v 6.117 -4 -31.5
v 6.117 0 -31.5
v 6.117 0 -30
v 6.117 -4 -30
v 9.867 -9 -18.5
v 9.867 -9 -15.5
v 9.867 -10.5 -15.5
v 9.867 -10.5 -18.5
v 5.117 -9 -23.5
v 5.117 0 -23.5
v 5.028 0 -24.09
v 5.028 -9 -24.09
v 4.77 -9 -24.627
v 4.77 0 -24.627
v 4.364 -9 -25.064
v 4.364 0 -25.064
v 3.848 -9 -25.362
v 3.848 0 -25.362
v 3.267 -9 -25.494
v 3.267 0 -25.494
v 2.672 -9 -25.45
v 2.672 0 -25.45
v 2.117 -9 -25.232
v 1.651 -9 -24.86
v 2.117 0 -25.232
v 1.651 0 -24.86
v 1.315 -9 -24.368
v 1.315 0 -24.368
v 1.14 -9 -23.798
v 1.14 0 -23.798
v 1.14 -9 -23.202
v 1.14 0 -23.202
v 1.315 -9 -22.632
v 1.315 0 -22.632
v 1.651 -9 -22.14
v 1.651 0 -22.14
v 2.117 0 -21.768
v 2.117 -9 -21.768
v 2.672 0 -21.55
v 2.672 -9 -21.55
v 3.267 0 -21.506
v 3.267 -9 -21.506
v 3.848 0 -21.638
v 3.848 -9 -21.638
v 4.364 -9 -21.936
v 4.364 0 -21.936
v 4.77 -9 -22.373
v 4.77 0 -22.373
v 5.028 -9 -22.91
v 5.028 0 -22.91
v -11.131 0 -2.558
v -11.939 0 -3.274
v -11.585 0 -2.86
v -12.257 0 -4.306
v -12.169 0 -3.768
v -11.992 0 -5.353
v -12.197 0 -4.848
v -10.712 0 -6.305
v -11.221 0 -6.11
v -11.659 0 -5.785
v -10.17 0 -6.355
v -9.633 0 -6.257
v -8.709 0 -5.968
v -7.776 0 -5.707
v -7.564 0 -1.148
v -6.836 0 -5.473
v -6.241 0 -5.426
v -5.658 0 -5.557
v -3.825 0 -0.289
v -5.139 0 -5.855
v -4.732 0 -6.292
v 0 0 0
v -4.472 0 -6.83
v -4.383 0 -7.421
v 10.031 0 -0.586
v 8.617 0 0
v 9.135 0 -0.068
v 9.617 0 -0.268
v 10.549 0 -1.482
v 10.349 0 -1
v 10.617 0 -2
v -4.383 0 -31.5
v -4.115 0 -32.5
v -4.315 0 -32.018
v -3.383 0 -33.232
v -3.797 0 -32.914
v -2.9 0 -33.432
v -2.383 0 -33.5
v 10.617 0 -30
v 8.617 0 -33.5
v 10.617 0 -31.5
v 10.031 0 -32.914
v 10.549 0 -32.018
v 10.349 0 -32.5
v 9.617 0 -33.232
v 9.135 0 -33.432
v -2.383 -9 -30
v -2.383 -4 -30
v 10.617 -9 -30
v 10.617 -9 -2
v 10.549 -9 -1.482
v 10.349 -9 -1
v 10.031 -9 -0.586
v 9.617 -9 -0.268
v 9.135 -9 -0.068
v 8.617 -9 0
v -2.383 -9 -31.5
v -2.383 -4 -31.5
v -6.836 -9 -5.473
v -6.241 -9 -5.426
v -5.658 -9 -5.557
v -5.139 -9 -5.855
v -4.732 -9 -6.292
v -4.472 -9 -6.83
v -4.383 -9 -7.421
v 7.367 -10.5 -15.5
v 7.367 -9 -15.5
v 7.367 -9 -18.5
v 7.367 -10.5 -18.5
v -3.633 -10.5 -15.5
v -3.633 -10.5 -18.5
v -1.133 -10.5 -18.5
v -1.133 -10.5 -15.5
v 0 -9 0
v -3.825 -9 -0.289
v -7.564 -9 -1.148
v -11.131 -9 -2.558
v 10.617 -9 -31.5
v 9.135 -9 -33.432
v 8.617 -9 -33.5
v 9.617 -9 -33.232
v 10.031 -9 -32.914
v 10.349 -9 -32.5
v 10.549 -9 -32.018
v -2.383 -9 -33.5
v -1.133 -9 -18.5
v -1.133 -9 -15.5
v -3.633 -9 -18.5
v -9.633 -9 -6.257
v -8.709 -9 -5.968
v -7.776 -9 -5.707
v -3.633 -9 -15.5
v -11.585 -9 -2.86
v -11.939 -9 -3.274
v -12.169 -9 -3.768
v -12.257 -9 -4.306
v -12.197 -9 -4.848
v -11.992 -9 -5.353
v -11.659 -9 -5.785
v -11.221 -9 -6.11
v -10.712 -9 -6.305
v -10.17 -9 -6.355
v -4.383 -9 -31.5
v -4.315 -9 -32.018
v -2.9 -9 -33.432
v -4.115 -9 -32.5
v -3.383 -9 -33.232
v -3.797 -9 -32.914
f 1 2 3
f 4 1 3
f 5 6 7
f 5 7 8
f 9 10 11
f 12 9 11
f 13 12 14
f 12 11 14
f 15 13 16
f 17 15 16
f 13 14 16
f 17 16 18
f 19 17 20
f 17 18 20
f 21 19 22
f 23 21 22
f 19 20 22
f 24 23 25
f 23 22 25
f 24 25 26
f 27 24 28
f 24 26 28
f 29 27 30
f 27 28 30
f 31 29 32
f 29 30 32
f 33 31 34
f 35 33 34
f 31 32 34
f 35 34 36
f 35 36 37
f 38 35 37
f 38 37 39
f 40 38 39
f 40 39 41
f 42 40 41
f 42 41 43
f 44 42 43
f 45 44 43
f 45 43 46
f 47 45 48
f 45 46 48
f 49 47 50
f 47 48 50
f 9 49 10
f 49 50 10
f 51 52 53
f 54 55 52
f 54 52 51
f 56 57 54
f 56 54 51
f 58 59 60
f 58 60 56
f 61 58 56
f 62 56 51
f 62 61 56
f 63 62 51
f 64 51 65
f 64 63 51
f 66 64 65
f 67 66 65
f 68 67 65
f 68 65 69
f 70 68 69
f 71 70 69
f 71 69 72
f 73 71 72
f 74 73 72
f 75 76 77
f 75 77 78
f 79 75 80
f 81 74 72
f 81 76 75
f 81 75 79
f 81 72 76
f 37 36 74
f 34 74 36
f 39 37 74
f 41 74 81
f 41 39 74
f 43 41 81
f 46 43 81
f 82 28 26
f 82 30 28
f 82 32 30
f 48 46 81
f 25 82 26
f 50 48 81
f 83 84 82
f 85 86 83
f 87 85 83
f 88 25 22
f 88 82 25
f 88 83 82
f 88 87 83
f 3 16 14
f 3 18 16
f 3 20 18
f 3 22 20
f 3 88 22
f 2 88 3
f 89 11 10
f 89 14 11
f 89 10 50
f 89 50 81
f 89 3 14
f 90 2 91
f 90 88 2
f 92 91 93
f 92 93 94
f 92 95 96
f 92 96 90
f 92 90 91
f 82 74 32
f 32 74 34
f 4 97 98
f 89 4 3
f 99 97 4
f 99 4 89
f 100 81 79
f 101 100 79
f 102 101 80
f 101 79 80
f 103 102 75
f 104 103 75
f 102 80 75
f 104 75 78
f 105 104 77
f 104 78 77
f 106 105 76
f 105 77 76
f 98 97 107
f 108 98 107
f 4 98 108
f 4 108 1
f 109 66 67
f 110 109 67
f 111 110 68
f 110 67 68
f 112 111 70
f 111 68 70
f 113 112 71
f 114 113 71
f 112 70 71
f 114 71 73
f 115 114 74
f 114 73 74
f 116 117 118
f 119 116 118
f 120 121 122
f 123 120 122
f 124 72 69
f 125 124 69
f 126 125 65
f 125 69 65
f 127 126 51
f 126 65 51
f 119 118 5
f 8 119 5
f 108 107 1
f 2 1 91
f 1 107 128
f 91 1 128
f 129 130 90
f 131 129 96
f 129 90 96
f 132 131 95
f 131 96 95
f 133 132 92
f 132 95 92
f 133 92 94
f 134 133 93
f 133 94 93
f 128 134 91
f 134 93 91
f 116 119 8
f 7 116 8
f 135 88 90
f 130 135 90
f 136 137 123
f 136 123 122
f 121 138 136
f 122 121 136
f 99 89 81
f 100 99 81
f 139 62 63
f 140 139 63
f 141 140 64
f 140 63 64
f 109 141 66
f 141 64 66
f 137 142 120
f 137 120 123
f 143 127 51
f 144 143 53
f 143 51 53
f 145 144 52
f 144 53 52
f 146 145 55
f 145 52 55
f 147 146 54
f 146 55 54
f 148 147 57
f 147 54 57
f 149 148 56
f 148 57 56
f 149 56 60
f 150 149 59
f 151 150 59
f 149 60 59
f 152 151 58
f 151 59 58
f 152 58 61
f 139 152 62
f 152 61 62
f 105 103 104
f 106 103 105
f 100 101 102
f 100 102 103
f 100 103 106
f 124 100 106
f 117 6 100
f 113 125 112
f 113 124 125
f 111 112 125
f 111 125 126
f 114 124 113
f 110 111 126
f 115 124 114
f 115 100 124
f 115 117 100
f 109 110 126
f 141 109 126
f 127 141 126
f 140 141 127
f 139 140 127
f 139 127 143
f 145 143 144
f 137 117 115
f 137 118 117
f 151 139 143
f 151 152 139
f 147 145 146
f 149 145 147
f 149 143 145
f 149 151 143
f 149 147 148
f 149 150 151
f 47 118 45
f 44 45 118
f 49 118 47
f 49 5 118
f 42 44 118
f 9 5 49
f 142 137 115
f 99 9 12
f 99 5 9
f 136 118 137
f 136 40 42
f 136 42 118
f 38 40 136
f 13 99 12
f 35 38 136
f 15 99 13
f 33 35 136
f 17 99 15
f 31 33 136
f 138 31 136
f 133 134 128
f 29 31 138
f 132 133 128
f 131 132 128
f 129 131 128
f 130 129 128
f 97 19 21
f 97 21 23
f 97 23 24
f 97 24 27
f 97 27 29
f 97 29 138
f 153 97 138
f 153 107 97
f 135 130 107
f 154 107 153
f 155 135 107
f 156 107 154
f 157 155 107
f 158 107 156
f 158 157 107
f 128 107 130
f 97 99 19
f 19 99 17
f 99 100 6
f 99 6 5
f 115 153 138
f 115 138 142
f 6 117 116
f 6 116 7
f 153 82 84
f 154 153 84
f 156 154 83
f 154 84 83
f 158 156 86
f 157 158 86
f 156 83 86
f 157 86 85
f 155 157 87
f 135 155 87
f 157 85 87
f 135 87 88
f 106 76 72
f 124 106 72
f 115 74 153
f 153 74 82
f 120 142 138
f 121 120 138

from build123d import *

# Parameters (mm, degrees)
SKETCH_1_R          = 2
EXTRUDE_1_DEPTH     = 9
SKETCH_3_W          = 2.5
SKETCH_3_H          = 3
EXTRUDE_2_DEPTH     = 1.5
CUT_EXTRUDE_1_REACH = 11
SKETCH_5_W          = 13
SKETCH_5_H          = 1.5
SKETCH_7_W          = 8.5
SKETCH_7_H          = 1.5
EXTRUDE_3_DEPTH     = 4
SKETCH_9_W          = 49.545975543
SKETCH_9_H          = 42.208236046
CUT_EXTRUDE_3_DEPTH = 11.5


with BuildPart() as part:
    # 草图1 → 凸台-拉伸1 (new body)
    with BuildSketch(Plane(origin=(0, 0, 0), x_dir=(1, 0, 0), z_dir=(0, 1, 0))):
        with BuildLine():
            Line((-2.382835885, 33.5), (8.617164115, 33.5))
            ThreePointArc((8.617164115, 33.5), (10.031377677, 32.914213562), (10.617164115, 31.5))
            Line((10.617164115, 31.5), (10.617164115, 2))
            ThreePointArc((10.617164115, 2), (10.031377677, 0.585786438), (8.617164115, 0))
            Line((8.617164115, 0), (0, 0))
            ThreePointArc((0, 0), (-5.710600422, 0.647655185), (-11.131122415, 2.557722132))
            ThreePointArc((-11.131122415, 2.557722132), (-12.111898361, 5.107720531), (-9.633282348, 6.257014206))
            ThreePointArc((-9.633282348, 6.257014206), (-8.243555708, 5.833986106), (-6.836394497, 5.473167269))
            ThreePointArc((-6.836394497, 5.473167269), (-5.139275919, 5.854675685), (-4.382835885, 7.421059613))
            Line((-4.382835885, 7.421059613), (-4.382835885, 31.5))
            ThreePointArc((-4.382835885, 31.5), (-3.797049447, 32.914213562), (-2.382835885, 33.5))
        make_face()
        with Locations((3.117164115, 23.5)):
            Circle(SKETCH_1_R, mode=Mode.SUBTRACT)
    extrude(amount=EXTRUDE_1_DEPTH)

    # 草图3 → 凸台-拉伸2 (add)
    with BuildSketch(Plane(origin=(0, 9, 0), x_dir=(1, 0, 0), z_dir=(0, 1, 0))):
        with Locations((-2.382835885, 17)):
            Rectangle(SKETCH_3_W, SKETCH_3_H)
        with Locations((8.617164115, 17)):
            Rectangle(SKETCH_3_W, SKETCH_3_H)
    extrude(amount=EXTRUDE_2_DEPTH)

    # 草图5 → 切除-拉伸1 (cut, up to next)
    with BuildSketch(Plane(origin=(0, 9, 0), x_dir=(1, 0, 0), z_dir=(0, 1, 0)), mode=Mode.PRIVATE) as cut_extrude_1_sk1:
        with Locations((4.117164115, 30.75)):
            Rectangle(SKETCH_5_W, SKETCH_5_H)
    cut_extrude_1_tool1 = extrude(cut_extrude_1_sk1.sketch, amount=-CUT_EXTRUDE_1_REACH, mode=Mode.PRIVATE) & part.part
    add(cut_extrude_1_tool1.solids().sort_by_distance((4.117164, 9, -30.75))[0], mode=Mode.SUBTRACT)

    # 草图7 → 凸台-拉伸3 (add)
    with BuildSketch(Plane.XZ):
        with Locations((1.867164115, -30.75)):
            Rectangle(SKETCH_7_W, SKETCH_7_H)
    extrude(amount=-EXTRUDE_3_DEPTH)

    # 镜向8: part across plane


with BuildPart() as part_1:
    add(part.part)
    add(part.part.mirror(Plane(origin=(0, 0, -25.5), x_dir=(0, 0, 1), z_dir=(0, -1, 0))))

    # 草图9 → 切除-拉伸3 (cut, through all)
    with BuildSketch(Plane(origin=(0, 0, 0), x_dir=(1, 0, 0), z_dir=(0, 1, 0))):
        with Locations((0.218507418, 15.905835279)):
            Rectangle(SKETCH_9_W, SKETCH_9_H)
    extrude(amount=CUT_EXTRUDE_3_DEPTH, mode=Mode.SUBTRACT)


solid = part_1.part
